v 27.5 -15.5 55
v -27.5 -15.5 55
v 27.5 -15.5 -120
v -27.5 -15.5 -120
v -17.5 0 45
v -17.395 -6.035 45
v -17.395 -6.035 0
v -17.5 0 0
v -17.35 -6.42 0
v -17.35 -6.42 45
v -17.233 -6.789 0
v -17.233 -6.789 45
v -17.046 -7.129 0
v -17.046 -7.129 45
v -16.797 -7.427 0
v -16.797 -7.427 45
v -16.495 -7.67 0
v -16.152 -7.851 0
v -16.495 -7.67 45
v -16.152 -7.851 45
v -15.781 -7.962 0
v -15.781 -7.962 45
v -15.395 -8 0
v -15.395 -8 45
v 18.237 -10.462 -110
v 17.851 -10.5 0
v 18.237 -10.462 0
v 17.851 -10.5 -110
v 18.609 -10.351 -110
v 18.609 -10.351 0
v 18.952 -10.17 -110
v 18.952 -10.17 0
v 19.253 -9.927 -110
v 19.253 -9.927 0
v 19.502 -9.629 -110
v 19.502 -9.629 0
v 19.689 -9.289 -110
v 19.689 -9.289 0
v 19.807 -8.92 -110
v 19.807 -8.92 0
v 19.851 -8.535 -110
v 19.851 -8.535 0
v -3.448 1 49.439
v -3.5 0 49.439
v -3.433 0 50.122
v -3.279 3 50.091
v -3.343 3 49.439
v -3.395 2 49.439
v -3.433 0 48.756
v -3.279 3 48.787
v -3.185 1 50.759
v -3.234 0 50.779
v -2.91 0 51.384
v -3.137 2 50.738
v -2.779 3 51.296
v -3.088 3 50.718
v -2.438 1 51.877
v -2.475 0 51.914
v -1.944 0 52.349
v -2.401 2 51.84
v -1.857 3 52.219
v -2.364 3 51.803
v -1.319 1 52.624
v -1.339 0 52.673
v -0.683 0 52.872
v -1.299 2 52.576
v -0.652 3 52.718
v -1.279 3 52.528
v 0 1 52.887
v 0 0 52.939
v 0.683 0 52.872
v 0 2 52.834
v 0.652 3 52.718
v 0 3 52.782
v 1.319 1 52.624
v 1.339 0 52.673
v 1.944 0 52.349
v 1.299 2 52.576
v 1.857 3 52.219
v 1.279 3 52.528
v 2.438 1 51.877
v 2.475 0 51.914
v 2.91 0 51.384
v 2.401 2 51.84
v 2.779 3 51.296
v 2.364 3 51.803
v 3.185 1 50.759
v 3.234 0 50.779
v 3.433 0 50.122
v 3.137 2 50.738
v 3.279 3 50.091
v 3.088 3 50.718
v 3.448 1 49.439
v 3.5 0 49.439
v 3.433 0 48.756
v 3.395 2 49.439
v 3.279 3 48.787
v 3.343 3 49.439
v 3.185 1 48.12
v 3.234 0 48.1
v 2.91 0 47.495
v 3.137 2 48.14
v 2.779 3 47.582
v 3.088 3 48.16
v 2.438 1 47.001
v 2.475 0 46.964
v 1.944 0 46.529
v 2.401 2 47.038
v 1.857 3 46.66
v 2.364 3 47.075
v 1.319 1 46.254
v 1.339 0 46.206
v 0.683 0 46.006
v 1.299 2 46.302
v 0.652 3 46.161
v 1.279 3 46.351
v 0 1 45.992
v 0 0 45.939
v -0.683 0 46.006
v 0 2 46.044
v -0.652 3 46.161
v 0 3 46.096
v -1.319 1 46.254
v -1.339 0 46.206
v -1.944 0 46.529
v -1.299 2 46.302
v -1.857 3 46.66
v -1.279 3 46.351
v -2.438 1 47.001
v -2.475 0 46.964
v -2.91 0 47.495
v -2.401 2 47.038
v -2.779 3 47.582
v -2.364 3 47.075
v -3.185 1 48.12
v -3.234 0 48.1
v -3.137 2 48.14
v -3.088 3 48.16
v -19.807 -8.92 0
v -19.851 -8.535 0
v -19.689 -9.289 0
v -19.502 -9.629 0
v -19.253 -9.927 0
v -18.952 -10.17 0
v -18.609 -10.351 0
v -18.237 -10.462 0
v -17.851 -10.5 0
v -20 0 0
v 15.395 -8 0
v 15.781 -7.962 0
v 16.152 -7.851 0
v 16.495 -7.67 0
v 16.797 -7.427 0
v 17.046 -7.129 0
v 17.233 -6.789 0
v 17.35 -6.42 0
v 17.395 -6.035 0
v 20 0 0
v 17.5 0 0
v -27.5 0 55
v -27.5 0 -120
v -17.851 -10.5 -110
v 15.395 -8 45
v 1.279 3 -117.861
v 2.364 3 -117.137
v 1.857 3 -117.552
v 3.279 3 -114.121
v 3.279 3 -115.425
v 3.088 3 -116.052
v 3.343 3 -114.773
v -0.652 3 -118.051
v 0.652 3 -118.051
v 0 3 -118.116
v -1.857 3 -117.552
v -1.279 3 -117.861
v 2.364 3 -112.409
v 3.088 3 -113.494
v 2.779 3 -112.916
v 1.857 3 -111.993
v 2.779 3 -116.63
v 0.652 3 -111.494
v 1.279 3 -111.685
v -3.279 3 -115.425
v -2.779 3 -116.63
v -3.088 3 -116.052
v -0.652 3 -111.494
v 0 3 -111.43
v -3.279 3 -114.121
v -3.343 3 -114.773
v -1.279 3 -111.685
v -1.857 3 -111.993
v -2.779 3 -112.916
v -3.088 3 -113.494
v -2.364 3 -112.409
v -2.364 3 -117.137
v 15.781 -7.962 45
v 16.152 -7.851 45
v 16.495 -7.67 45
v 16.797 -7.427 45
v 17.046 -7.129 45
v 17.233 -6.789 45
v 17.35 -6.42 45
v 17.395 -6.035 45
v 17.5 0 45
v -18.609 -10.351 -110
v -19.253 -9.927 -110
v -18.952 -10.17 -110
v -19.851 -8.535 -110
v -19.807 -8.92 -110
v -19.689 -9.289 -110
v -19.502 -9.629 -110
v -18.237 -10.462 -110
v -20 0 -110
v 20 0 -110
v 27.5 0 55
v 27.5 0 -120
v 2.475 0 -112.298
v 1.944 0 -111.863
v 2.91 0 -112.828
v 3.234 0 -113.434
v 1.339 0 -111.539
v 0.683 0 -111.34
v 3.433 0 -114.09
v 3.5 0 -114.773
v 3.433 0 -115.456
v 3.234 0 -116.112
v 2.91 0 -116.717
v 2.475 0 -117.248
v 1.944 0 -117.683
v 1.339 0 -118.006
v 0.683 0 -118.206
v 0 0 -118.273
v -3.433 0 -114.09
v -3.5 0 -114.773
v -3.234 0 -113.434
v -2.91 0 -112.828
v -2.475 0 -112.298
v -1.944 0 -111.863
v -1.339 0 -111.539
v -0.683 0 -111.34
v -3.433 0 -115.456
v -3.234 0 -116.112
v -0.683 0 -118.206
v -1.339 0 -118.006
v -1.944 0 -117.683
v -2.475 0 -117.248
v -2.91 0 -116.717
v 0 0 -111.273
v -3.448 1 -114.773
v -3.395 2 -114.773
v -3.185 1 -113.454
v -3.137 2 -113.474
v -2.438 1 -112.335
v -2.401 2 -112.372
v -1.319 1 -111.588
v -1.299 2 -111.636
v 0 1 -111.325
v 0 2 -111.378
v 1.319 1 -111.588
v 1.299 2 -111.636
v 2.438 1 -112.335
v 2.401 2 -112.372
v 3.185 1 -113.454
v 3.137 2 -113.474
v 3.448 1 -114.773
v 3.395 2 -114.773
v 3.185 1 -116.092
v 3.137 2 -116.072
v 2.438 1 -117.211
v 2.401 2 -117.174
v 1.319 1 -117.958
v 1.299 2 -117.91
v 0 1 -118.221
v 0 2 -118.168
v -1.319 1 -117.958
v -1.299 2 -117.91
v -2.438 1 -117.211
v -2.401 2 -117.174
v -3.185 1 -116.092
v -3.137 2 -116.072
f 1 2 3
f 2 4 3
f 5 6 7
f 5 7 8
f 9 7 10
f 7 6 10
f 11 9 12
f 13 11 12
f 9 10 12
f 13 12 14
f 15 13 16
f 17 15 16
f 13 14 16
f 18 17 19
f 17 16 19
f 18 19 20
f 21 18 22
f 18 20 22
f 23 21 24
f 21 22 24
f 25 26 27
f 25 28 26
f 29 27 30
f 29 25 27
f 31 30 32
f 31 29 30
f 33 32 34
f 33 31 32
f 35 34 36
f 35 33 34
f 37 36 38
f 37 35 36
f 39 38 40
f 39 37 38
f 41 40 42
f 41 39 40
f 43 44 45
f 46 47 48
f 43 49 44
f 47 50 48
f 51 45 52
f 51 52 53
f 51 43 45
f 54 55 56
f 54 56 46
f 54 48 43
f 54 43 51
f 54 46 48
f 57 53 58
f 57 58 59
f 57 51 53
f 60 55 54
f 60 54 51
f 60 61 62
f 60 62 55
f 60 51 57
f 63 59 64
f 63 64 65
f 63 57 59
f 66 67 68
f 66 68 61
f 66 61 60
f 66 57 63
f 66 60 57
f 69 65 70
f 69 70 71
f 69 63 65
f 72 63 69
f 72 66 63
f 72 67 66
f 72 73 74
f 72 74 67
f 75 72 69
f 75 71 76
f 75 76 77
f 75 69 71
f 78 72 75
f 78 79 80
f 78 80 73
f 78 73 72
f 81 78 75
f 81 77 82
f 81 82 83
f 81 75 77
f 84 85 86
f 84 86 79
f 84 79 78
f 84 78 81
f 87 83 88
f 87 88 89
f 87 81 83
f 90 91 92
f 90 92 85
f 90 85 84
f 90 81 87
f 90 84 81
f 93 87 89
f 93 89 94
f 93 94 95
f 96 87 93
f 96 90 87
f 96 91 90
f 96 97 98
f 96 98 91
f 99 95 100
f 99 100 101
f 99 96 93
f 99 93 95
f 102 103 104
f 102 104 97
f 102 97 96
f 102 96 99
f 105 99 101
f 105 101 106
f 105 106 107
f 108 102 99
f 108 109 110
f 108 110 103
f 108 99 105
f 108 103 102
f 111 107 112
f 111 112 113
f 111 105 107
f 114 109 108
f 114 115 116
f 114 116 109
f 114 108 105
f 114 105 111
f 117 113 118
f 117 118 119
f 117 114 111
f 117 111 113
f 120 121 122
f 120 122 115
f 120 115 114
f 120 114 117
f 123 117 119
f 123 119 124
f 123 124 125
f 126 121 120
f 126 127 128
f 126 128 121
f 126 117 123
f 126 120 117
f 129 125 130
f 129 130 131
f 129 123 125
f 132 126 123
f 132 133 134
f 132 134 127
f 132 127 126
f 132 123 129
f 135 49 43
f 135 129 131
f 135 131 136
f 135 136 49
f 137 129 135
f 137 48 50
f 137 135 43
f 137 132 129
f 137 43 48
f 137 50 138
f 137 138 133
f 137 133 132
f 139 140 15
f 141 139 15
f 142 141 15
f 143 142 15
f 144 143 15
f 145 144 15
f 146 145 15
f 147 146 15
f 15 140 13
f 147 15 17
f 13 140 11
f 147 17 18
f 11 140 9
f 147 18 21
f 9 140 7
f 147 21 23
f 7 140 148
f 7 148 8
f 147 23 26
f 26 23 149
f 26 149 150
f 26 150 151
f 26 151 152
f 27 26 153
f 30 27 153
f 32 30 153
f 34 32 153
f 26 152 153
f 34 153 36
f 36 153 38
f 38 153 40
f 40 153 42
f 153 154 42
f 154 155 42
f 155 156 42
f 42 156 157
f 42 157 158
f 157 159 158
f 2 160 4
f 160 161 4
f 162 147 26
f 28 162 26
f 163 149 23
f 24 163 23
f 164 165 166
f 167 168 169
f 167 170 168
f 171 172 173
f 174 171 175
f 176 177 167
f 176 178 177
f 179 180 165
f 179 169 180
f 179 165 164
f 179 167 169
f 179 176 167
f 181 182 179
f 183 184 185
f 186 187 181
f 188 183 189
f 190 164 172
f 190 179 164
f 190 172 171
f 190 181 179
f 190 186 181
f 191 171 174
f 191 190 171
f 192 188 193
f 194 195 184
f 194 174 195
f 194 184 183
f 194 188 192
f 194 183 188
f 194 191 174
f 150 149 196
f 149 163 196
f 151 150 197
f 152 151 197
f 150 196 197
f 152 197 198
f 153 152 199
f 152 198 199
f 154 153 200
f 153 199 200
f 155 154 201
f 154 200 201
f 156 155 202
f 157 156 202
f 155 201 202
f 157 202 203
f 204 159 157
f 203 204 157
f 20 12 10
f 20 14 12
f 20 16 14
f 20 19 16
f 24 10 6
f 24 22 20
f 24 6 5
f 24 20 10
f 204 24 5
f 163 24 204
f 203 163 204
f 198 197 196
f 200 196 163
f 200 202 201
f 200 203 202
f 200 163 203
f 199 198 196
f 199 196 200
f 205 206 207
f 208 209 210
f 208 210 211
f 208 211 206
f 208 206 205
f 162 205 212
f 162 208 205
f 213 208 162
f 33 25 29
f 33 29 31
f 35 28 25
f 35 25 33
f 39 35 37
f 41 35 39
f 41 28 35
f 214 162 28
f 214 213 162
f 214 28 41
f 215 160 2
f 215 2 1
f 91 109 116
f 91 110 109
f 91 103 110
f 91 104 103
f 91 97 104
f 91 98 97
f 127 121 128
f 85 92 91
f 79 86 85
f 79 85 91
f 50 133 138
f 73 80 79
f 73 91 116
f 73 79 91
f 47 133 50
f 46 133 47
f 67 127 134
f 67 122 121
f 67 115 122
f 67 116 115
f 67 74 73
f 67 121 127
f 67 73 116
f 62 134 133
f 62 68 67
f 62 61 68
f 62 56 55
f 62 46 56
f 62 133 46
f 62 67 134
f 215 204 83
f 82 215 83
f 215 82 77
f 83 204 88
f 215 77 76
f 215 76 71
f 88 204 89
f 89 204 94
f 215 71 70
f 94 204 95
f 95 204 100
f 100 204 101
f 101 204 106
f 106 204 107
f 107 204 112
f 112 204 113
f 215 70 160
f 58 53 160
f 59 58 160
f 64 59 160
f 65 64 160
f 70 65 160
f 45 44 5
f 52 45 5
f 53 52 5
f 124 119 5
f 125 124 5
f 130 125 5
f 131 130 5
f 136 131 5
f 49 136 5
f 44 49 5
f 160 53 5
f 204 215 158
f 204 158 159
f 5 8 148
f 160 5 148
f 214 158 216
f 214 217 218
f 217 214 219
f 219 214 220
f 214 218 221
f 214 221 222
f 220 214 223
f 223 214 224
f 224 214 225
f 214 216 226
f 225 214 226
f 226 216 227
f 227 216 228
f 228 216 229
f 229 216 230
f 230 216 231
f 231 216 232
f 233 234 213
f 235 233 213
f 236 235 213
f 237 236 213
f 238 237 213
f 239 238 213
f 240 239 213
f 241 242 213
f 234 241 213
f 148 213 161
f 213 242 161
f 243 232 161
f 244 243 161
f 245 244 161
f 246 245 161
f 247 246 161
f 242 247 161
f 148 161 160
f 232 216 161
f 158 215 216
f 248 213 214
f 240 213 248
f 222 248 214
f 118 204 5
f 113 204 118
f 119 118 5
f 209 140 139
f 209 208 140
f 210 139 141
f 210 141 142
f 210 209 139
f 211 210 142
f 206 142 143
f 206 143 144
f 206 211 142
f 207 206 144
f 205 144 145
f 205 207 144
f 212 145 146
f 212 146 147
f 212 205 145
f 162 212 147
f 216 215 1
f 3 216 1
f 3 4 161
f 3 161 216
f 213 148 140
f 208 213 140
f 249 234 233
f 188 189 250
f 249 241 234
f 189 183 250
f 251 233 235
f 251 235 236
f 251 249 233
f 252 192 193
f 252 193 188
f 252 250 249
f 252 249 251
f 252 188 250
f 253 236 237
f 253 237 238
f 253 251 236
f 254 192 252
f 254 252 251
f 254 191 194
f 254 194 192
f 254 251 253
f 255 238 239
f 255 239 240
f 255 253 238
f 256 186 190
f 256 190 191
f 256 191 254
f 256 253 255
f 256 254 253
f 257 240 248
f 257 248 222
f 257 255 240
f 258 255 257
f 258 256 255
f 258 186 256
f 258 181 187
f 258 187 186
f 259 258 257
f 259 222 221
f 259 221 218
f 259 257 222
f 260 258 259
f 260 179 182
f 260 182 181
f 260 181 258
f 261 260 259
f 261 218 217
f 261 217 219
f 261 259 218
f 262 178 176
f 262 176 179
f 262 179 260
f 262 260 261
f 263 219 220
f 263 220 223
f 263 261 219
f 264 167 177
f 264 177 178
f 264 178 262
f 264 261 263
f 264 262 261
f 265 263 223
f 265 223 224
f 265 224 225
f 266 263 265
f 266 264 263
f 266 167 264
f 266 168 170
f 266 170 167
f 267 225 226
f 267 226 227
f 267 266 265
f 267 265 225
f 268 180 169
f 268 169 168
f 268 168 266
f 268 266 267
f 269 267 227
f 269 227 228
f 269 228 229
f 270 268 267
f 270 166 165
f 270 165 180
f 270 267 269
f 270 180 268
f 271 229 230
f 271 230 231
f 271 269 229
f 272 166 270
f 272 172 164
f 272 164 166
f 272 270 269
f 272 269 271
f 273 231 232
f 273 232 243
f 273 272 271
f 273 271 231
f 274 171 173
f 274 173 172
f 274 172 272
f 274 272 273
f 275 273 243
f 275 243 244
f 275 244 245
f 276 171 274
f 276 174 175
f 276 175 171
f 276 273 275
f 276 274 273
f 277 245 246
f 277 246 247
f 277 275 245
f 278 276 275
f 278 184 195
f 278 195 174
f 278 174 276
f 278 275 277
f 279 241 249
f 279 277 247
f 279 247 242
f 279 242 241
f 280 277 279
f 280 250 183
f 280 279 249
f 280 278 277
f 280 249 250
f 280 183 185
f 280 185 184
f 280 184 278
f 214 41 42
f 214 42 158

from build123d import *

# Parameters (mm, degrees)
F0_W      = 50
F0_H      = 26
F1_DEPTH  = 55
F3_DEPTH  = 45
F4_R      = 2
F5_R      = 2
F6_W      = 55
F6_H      = 31
F7_DEPTH  = 120
F9_DEPTH  = 110
F10_R     = 2
F11_W     = 193.8701719046
F11_H     = 235.1342812181
F12_DEPTH = 15.501
F13_R     = 3.5
F14_DEPTH = 3
F14_TAPER = 3
F15_R     = 3.5
F16_DEPTH = 3
F16_TAPER = 3
F18_DEPTH = 55


with BuildPart() as f1:
    # F0 (on Top) → F1 (new body)
    with BuildSketch(Plane.XY):
        Rectangle(F0_W, F0_H)
    extrude(amount=F1_DEPTH)

    # F2 (on face) → F3 (cut)
    with BuildSketch(Plane(origin=(0, 0, 0), x_dir=(1, 0, 0), z_dir=(0, 0, -1))):
        Polygon((-17.3603594806, -8), (17.3603594806, -8), (17.5, 0), (17.3603594806, 8), (-17.3603594806, 8), (-17.5, 0), align=None)
    extrude(amount=-F3_DEPTH, mode=Mode.SUBTRACT)

    # F4
    f4_edges = [f1.edges().sort_by_distance(p)[0] for p in [
        (-17.360359, 8, 22.5),
        (17.360359, 8, 22.5),
    ]]
    fillet(f4_edges, radius=F4_R)

    # F5
    f5_edges = [f1.edges().sort_by_distance(p)[0] for p in [
        (-17.360359, -8, 22.5),
        (17.360359, -8, 22.5),
    ]]
    fillet(f5_edges, radius=F5_R)

    # F6 (on face) → F7 (join)
    with BuildSketch(Plane(origin=(0, 0, 0), x_dir=(1, 0, 0), z_dir=(0, 0, -1))):
        Rectangle(F6_W, F6_H)
    extrude(amount=F7_DEPTH)

    # F8 (on face) → F9 (cut)
    with BuildSketch(Plane.XY):
        Polygon((-19.8167218183, 10.5), (-20, 0), (-19.8167218183, -10.5), (19.8167218183, -10.5), (20, 0), (19.8167218183, 10.5), align=None)
    extrude(amount=-F9_DEPTH, mode=Mode.SUBTRACT)

    # F10
    f10_edges = [f1.edges().sort_by_distance(p)[0] for p in [
        (-19.816722, -10.5, -55),
        (19.816722, -10.5, -55),
        (-19.816722, 10.5, -55),
        (19.816722, 10.5, -55),
    ]]
    fillet(f10_edges, radius=F10_R)

    # F11 (on Front) → F12 (cut, through all)
    with BuildSketch(Plane.XZ):
        with Locations((2.0464733243, -30.8961831033)):
            Rectangle(F11_W, F11_H)
    extrude(amount=-F12_DEPTH, mode=Mode.SUBTRACT)

    # F13 (on face) → F14 (join)
    with BuildSketch(Plane(origin=(0, 0, 0), x_dir=(-1, 0, 0), z_dir=(0, 1, 0))):
        with Locations((0, 49.4391918182)):
            Circle(F13_R)
    extrude(amount=F14_DEPTH, taper=F14_TAPER)

    # F15 (on face) → F16 (join)
    with BuildSketch(Plane(origin=(0, 0, 0), x_dir=(-1, 0, 0), z_dir=(0, 1, 0))):
        with Locations((0, -114.7729158401)):
            Circle(F15_R)
    extrude(amount=F16_DEPTH, taper=F16_TAPER)

    # F17 (on face) → F18 (join, through all)
    with BuildSketch(Plane.XY):
        Polygon((-25, 0), (-27.5, 0), (-27.5, -15.5), (27.5, -15.5), (27.5, 0), (25, 0), (25, -13), (-25, -13), align=None)
    extrude(amount=F18_DEPTH)


solid = f1.part
